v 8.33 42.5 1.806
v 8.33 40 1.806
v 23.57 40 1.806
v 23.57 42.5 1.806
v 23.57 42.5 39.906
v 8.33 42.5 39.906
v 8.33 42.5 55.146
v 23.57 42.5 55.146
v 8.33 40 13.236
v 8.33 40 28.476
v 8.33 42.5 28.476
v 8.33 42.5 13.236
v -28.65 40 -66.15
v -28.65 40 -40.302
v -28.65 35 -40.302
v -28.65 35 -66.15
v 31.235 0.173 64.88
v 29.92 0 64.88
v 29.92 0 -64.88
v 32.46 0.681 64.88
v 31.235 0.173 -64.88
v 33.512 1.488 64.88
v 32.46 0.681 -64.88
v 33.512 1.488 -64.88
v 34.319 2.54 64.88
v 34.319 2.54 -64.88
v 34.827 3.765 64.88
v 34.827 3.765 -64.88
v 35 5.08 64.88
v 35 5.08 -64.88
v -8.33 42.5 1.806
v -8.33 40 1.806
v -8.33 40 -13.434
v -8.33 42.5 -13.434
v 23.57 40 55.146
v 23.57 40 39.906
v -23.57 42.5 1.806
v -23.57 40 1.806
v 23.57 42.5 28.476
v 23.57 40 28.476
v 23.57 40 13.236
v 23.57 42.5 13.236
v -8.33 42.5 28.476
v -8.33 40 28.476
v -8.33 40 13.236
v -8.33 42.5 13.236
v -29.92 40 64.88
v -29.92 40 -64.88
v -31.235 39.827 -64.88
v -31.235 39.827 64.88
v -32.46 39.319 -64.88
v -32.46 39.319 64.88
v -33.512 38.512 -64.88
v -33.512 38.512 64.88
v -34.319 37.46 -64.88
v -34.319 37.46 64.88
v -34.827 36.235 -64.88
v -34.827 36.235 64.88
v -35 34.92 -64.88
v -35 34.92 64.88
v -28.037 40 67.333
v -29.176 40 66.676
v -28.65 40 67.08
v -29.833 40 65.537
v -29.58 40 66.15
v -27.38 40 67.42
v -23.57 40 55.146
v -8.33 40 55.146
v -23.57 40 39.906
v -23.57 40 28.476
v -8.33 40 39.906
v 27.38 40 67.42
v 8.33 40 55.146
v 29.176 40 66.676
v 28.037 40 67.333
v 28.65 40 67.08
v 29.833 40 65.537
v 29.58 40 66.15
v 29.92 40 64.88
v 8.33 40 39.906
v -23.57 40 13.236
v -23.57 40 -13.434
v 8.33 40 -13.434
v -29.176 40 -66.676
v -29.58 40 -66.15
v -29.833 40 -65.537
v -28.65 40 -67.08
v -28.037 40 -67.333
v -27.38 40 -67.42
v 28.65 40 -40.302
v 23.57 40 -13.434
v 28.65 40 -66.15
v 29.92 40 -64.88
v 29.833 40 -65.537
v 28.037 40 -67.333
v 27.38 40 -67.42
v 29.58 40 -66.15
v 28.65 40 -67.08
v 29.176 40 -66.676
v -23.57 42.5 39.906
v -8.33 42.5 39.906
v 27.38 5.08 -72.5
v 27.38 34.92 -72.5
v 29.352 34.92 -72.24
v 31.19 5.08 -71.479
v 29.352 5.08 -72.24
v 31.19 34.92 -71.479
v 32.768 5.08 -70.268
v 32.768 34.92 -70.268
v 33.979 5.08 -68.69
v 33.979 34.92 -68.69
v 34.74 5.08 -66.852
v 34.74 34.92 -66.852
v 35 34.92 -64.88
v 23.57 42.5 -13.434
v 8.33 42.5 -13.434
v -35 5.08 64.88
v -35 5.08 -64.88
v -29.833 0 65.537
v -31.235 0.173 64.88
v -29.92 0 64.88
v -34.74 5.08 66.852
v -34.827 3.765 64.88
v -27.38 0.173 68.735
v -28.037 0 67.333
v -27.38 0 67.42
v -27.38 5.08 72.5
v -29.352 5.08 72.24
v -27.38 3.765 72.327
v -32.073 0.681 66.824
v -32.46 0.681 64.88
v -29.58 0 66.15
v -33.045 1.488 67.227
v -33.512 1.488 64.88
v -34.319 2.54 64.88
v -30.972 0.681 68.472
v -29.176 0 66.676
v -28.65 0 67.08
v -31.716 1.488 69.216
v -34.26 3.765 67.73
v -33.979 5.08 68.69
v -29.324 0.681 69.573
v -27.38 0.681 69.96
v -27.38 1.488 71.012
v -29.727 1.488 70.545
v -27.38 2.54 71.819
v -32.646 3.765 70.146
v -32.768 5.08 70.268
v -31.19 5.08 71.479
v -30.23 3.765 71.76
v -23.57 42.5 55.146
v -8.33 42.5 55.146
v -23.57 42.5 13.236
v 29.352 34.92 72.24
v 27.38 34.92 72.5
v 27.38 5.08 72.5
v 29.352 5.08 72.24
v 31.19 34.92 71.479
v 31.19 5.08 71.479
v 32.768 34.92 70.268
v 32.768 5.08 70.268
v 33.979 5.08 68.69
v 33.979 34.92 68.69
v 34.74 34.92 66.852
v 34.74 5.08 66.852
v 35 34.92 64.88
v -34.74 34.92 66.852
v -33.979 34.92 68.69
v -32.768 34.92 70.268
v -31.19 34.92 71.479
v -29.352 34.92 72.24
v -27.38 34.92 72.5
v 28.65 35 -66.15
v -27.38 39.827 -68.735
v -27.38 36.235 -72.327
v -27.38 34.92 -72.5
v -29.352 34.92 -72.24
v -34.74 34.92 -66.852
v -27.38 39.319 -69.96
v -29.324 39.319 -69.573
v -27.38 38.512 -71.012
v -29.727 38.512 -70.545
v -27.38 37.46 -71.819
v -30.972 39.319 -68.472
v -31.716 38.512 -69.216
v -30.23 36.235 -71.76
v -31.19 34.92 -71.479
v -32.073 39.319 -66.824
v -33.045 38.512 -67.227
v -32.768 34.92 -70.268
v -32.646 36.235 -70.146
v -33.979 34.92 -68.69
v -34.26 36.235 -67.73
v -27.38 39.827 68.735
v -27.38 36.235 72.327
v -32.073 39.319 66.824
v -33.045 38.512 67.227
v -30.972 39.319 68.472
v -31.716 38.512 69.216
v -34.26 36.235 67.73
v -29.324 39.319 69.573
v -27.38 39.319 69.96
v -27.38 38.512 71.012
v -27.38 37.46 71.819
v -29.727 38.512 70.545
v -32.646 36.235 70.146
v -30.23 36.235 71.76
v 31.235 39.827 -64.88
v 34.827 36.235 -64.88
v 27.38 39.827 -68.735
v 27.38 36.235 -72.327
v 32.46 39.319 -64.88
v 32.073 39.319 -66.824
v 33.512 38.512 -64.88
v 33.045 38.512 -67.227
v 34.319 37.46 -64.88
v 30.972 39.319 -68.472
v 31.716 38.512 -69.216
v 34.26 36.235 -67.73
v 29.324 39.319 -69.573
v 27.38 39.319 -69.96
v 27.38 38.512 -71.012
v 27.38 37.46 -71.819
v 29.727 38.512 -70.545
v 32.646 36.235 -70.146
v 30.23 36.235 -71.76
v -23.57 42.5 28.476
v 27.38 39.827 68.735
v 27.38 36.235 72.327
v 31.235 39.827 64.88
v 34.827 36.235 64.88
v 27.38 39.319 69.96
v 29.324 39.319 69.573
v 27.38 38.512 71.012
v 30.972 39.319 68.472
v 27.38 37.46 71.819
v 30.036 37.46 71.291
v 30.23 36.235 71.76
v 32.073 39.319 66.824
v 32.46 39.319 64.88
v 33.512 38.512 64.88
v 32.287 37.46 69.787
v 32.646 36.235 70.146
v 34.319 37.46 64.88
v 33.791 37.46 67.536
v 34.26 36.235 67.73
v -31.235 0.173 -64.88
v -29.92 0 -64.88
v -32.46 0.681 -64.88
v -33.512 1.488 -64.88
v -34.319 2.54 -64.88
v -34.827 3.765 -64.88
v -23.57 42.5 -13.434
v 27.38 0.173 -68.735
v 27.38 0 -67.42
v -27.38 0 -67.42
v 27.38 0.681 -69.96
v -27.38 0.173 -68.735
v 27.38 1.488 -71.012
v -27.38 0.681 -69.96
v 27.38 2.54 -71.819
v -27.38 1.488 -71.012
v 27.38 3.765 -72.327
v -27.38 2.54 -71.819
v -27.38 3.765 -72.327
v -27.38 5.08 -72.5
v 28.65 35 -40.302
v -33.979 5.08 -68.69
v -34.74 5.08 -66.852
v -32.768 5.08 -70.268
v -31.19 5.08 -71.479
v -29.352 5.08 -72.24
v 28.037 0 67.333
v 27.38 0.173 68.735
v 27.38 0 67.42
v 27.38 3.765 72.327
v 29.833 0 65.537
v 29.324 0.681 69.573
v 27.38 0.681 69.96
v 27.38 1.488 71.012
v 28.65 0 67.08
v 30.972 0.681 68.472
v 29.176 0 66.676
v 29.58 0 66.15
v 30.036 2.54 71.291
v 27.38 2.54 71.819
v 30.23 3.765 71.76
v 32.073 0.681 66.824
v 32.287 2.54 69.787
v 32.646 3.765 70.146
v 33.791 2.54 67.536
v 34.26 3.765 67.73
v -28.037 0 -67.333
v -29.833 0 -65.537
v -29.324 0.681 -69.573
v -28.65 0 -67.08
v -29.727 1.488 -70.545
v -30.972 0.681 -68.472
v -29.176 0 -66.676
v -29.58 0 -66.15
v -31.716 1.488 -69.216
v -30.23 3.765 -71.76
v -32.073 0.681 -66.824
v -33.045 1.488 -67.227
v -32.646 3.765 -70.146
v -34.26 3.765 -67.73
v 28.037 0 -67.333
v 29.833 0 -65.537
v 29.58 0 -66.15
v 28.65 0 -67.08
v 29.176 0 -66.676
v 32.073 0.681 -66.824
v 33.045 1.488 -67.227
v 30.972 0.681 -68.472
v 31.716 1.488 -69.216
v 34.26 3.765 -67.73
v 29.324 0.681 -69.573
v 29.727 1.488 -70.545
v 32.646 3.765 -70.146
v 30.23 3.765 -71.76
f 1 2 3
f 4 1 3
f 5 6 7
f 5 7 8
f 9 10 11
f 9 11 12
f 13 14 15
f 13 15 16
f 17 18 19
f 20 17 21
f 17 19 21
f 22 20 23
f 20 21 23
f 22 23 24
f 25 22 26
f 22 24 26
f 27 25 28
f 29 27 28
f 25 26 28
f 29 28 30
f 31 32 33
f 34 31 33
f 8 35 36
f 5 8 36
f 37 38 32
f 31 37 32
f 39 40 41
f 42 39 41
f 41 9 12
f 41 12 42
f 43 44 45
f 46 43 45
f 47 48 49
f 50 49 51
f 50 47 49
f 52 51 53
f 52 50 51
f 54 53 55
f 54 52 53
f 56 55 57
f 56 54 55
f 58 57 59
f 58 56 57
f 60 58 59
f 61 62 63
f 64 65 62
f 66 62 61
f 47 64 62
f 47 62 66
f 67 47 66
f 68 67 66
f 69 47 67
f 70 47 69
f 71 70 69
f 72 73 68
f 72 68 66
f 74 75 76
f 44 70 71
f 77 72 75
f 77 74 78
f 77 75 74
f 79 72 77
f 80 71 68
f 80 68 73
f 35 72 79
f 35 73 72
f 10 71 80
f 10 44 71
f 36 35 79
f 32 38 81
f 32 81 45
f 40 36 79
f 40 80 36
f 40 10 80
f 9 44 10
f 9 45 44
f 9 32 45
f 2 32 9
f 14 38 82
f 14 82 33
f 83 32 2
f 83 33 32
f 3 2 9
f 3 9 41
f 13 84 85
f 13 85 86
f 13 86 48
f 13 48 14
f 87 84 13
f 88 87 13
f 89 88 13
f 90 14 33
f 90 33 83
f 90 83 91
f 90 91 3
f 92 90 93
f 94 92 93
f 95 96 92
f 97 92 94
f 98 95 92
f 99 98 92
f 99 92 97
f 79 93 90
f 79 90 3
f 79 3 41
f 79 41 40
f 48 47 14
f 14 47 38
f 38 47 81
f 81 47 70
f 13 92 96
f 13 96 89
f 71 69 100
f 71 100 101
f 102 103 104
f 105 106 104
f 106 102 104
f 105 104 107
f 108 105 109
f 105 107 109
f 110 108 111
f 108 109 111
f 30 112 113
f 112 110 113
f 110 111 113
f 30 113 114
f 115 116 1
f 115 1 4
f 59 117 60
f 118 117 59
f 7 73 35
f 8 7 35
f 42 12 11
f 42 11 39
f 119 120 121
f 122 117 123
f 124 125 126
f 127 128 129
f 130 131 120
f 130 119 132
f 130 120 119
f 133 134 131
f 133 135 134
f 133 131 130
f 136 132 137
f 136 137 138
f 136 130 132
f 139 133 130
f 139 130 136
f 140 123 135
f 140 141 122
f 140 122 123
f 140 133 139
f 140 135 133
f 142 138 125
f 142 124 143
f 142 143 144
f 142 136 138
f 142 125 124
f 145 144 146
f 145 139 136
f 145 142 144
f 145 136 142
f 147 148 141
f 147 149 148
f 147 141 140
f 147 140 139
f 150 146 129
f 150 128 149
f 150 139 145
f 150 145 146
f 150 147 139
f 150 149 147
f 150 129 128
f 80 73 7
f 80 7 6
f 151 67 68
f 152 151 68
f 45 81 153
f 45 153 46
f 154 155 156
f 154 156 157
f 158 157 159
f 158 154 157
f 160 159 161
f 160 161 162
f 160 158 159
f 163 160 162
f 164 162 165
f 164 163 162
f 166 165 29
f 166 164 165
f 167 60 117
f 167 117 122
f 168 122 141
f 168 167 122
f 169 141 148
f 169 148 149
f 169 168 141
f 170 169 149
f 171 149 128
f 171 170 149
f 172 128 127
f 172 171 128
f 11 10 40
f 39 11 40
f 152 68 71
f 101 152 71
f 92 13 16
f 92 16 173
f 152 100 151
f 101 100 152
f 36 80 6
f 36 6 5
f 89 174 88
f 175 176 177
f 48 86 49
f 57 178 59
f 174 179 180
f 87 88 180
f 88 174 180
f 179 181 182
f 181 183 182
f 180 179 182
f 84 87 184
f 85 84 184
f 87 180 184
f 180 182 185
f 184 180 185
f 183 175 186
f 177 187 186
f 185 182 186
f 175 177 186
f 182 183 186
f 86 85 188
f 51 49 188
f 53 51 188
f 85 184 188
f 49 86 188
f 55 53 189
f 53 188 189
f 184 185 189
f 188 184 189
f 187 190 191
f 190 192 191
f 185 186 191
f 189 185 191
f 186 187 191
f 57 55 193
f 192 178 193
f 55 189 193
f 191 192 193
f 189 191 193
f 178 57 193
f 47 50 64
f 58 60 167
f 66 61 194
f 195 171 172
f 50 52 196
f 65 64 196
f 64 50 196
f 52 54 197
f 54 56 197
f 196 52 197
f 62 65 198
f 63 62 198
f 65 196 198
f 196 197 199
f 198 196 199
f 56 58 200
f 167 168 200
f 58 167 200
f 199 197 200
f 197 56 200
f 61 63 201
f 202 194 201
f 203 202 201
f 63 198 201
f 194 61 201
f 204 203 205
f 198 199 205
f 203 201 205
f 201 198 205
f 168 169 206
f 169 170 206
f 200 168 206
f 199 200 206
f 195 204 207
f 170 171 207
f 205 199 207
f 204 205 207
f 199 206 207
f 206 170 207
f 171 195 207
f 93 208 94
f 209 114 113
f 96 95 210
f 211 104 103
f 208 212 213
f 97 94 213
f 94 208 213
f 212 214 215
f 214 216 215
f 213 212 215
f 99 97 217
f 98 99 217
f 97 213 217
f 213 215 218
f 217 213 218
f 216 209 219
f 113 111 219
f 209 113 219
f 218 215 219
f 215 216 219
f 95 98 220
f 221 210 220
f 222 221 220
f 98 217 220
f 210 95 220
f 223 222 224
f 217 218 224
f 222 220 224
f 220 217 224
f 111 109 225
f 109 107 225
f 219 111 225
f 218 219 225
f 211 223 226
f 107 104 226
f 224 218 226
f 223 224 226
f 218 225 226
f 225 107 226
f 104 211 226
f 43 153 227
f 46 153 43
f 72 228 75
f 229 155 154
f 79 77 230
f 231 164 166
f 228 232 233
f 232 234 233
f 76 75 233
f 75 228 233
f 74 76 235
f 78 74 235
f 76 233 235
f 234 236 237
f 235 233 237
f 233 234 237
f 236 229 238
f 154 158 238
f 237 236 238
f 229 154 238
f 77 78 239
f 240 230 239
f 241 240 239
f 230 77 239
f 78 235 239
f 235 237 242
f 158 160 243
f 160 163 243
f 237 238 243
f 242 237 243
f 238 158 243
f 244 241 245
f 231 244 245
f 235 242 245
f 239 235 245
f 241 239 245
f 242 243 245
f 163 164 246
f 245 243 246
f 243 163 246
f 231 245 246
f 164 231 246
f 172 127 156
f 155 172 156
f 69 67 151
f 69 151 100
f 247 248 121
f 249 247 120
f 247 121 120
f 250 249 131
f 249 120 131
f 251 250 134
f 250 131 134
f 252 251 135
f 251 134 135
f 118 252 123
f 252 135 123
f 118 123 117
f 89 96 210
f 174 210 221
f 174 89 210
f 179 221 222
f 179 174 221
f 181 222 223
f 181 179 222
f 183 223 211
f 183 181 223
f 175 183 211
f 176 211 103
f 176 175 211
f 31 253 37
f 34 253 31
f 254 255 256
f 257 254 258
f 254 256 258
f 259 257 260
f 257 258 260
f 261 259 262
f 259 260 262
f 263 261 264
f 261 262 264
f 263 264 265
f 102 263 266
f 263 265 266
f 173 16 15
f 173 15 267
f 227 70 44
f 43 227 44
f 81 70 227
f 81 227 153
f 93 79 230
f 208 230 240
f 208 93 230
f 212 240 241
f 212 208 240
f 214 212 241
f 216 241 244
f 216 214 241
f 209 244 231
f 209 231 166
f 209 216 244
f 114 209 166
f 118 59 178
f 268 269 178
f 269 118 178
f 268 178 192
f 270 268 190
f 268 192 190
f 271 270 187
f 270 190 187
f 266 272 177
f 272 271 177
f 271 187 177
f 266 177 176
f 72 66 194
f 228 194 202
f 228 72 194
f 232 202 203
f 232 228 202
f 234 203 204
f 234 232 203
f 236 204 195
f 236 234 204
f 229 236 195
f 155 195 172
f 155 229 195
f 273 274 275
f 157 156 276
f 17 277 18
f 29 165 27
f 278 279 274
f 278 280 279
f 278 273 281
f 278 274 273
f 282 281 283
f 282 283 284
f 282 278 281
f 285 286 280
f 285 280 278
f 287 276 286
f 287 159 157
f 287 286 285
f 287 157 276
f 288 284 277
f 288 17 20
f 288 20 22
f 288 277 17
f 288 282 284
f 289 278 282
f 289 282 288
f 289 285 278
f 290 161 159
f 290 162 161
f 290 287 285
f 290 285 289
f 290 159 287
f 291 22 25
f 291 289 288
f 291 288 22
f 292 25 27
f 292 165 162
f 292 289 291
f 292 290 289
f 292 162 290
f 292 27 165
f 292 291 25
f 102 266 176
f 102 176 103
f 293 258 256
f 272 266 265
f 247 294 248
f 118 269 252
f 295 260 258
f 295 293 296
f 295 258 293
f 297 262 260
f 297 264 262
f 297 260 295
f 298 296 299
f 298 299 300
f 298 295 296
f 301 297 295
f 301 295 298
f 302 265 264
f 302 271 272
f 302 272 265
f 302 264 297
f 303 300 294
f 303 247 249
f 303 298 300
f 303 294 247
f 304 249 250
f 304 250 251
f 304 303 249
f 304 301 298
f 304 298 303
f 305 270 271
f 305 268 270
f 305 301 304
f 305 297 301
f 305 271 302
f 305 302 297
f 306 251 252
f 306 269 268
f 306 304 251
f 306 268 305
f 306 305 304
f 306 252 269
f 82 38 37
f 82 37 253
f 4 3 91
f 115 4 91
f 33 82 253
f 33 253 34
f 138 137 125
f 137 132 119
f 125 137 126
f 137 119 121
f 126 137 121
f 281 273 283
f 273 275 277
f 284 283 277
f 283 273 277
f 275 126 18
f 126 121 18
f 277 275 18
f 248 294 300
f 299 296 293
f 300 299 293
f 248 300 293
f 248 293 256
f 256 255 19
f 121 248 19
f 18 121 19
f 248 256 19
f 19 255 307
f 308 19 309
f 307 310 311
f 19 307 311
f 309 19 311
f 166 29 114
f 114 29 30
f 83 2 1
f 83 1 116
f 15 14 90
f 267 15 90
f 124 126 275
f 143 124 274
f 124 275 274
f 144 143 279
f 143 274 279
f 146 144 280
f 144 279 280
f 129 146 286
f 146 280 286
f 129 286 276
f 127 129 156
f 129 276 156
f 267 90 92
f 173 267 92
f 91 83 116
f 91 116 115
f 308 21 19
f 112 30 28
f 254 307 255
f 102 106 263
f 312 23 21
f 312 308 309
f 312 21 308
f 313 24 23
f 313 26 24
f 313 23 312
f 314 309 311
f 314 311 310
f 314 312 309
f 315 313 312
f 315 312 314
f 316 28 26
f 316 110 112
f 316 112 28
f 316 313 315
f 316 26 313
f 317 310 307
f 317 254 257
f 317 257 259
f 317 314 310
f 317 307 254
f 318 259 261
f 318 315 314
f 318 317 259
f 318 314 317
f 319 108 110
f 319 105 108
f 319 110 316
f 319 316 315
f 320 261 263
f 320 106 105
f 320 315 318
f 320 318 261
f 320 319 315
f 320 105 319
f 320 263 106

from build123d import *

# Parameters (mm, degrees)
SKETCH1_W           = 70
SKETCH1_H           = 145
BOSS_EXTRUDE1_DEPTH = 40
SKETCH2_W           = 57.3
SKETCH2_H           = 25.847658175
CUT_EXTRUDE1_DEPTH  = 5
SKETCH3_W           = 15.24
SKETCH3_H           = 15.24
BOSS_EXTRUDE2_DEPTH = 2.5
LPATTERN1_COUNT     = 3
LPATTERN1_PITCH     = 26.67
FILLET1_R           = 7.62
FILLET2_R           = 5.08
FILLET3_R           = 5.08


with BuildPart() as part:
    # Sketch1 → Boss-Extrude1 (new body)
    with BuildSketch(Plane(origin=(0, 0, 0), x_dir=(1, 0, 0), z_dir=(0, 1, 0))):
        Rectangle(SKETCH1_W, SKETCH1_H)
    extrude(amount=BOSS_EXTRUDE1_DEPTH)

    # Sketch2 → Cut-Extrude1 (cut)
    with BuildSketch(Plane(origin=(0, 40, 0), x_dir=(1, 0, 0), z_dir=(0, 1, 0))):
        with Locations((0, 53.226170913)):
            Rectangle(SKETCH2_W, SKETCH2_H)
    extrude(amount=-CUT_EXTRUDE1_DEPTH, mode=Mode.SUBTRACT)

    # Sketch3 → Boss-Extrude2 (add)
    with BuildSketch(Plane(origin=(0, 40, 0), x_dir=(1, 0, 0), z_dir=(0, 1, 0))):
        with Locations((-15.95, 5.814113942)):
            Rectangle(SKETCH3_W, SKETCH3_H)
        with Locations((15.95, 5.814113942)):
            Rectangle(SKETCH3_W, SKETCH3_H)
    boss_extrude2 = extrude(amount=BOSS_EXTRUDE2_DEPTH)

    # LPattern1: Boss-Extrude2 ×3
    with Locations(*[(0, 0, i * LPATTERN1_PITCH) for i in range(1, LPATTERN1_COUNT)]):
        add(boss_extrude2)

    # Fillet1
    fillet1_edges = [part.edges().sort_by_distance(p)[0] for p in [
        (35, 20, 72.5),
        (-35, 20, 72.5),
        (-35, 20, -72.5),
        (35, 20, -72.5),
    ]]
    fillet(fillet1_edges, radius=FILLET1_R)

    # Fillet2
    fillet2_edges = [part.edges().sort_by_distance(p)[0] for p in [
        (35, 40, 0),
        (0, 40, 72.5),
        (0, 40, -72.5),
        (-35, 40, 0),
        (32.768153673, 40, -70.268153673),
        (-32.768153673, 40, -70.268153673),
        (-32.768153673, 40, 70.268153673),
        (32.768153673, 40, 70.268153673),
    ]]
    fillet(fillet2_edges, radius=FILLET2_R)

    # Fillet3
    fillet3_edges = [part.edges().sort_by_distance(p)[0] for p in [
        (35, 0, 0),
        (0, 0, 72.5),
        (-35, 0, 0),
        (0, 0, -72.5),
        (32.768153673, 0, -70.268153673),
        (-32.768153673, 0, -70.268153673),
        (-32.768153673, 0, 70.268153673),
        (32.768153673, 0, 70.268153673),
    ]]
    fillet(fillet3_edges, radius=FILLET3_R)


solid = part.part
